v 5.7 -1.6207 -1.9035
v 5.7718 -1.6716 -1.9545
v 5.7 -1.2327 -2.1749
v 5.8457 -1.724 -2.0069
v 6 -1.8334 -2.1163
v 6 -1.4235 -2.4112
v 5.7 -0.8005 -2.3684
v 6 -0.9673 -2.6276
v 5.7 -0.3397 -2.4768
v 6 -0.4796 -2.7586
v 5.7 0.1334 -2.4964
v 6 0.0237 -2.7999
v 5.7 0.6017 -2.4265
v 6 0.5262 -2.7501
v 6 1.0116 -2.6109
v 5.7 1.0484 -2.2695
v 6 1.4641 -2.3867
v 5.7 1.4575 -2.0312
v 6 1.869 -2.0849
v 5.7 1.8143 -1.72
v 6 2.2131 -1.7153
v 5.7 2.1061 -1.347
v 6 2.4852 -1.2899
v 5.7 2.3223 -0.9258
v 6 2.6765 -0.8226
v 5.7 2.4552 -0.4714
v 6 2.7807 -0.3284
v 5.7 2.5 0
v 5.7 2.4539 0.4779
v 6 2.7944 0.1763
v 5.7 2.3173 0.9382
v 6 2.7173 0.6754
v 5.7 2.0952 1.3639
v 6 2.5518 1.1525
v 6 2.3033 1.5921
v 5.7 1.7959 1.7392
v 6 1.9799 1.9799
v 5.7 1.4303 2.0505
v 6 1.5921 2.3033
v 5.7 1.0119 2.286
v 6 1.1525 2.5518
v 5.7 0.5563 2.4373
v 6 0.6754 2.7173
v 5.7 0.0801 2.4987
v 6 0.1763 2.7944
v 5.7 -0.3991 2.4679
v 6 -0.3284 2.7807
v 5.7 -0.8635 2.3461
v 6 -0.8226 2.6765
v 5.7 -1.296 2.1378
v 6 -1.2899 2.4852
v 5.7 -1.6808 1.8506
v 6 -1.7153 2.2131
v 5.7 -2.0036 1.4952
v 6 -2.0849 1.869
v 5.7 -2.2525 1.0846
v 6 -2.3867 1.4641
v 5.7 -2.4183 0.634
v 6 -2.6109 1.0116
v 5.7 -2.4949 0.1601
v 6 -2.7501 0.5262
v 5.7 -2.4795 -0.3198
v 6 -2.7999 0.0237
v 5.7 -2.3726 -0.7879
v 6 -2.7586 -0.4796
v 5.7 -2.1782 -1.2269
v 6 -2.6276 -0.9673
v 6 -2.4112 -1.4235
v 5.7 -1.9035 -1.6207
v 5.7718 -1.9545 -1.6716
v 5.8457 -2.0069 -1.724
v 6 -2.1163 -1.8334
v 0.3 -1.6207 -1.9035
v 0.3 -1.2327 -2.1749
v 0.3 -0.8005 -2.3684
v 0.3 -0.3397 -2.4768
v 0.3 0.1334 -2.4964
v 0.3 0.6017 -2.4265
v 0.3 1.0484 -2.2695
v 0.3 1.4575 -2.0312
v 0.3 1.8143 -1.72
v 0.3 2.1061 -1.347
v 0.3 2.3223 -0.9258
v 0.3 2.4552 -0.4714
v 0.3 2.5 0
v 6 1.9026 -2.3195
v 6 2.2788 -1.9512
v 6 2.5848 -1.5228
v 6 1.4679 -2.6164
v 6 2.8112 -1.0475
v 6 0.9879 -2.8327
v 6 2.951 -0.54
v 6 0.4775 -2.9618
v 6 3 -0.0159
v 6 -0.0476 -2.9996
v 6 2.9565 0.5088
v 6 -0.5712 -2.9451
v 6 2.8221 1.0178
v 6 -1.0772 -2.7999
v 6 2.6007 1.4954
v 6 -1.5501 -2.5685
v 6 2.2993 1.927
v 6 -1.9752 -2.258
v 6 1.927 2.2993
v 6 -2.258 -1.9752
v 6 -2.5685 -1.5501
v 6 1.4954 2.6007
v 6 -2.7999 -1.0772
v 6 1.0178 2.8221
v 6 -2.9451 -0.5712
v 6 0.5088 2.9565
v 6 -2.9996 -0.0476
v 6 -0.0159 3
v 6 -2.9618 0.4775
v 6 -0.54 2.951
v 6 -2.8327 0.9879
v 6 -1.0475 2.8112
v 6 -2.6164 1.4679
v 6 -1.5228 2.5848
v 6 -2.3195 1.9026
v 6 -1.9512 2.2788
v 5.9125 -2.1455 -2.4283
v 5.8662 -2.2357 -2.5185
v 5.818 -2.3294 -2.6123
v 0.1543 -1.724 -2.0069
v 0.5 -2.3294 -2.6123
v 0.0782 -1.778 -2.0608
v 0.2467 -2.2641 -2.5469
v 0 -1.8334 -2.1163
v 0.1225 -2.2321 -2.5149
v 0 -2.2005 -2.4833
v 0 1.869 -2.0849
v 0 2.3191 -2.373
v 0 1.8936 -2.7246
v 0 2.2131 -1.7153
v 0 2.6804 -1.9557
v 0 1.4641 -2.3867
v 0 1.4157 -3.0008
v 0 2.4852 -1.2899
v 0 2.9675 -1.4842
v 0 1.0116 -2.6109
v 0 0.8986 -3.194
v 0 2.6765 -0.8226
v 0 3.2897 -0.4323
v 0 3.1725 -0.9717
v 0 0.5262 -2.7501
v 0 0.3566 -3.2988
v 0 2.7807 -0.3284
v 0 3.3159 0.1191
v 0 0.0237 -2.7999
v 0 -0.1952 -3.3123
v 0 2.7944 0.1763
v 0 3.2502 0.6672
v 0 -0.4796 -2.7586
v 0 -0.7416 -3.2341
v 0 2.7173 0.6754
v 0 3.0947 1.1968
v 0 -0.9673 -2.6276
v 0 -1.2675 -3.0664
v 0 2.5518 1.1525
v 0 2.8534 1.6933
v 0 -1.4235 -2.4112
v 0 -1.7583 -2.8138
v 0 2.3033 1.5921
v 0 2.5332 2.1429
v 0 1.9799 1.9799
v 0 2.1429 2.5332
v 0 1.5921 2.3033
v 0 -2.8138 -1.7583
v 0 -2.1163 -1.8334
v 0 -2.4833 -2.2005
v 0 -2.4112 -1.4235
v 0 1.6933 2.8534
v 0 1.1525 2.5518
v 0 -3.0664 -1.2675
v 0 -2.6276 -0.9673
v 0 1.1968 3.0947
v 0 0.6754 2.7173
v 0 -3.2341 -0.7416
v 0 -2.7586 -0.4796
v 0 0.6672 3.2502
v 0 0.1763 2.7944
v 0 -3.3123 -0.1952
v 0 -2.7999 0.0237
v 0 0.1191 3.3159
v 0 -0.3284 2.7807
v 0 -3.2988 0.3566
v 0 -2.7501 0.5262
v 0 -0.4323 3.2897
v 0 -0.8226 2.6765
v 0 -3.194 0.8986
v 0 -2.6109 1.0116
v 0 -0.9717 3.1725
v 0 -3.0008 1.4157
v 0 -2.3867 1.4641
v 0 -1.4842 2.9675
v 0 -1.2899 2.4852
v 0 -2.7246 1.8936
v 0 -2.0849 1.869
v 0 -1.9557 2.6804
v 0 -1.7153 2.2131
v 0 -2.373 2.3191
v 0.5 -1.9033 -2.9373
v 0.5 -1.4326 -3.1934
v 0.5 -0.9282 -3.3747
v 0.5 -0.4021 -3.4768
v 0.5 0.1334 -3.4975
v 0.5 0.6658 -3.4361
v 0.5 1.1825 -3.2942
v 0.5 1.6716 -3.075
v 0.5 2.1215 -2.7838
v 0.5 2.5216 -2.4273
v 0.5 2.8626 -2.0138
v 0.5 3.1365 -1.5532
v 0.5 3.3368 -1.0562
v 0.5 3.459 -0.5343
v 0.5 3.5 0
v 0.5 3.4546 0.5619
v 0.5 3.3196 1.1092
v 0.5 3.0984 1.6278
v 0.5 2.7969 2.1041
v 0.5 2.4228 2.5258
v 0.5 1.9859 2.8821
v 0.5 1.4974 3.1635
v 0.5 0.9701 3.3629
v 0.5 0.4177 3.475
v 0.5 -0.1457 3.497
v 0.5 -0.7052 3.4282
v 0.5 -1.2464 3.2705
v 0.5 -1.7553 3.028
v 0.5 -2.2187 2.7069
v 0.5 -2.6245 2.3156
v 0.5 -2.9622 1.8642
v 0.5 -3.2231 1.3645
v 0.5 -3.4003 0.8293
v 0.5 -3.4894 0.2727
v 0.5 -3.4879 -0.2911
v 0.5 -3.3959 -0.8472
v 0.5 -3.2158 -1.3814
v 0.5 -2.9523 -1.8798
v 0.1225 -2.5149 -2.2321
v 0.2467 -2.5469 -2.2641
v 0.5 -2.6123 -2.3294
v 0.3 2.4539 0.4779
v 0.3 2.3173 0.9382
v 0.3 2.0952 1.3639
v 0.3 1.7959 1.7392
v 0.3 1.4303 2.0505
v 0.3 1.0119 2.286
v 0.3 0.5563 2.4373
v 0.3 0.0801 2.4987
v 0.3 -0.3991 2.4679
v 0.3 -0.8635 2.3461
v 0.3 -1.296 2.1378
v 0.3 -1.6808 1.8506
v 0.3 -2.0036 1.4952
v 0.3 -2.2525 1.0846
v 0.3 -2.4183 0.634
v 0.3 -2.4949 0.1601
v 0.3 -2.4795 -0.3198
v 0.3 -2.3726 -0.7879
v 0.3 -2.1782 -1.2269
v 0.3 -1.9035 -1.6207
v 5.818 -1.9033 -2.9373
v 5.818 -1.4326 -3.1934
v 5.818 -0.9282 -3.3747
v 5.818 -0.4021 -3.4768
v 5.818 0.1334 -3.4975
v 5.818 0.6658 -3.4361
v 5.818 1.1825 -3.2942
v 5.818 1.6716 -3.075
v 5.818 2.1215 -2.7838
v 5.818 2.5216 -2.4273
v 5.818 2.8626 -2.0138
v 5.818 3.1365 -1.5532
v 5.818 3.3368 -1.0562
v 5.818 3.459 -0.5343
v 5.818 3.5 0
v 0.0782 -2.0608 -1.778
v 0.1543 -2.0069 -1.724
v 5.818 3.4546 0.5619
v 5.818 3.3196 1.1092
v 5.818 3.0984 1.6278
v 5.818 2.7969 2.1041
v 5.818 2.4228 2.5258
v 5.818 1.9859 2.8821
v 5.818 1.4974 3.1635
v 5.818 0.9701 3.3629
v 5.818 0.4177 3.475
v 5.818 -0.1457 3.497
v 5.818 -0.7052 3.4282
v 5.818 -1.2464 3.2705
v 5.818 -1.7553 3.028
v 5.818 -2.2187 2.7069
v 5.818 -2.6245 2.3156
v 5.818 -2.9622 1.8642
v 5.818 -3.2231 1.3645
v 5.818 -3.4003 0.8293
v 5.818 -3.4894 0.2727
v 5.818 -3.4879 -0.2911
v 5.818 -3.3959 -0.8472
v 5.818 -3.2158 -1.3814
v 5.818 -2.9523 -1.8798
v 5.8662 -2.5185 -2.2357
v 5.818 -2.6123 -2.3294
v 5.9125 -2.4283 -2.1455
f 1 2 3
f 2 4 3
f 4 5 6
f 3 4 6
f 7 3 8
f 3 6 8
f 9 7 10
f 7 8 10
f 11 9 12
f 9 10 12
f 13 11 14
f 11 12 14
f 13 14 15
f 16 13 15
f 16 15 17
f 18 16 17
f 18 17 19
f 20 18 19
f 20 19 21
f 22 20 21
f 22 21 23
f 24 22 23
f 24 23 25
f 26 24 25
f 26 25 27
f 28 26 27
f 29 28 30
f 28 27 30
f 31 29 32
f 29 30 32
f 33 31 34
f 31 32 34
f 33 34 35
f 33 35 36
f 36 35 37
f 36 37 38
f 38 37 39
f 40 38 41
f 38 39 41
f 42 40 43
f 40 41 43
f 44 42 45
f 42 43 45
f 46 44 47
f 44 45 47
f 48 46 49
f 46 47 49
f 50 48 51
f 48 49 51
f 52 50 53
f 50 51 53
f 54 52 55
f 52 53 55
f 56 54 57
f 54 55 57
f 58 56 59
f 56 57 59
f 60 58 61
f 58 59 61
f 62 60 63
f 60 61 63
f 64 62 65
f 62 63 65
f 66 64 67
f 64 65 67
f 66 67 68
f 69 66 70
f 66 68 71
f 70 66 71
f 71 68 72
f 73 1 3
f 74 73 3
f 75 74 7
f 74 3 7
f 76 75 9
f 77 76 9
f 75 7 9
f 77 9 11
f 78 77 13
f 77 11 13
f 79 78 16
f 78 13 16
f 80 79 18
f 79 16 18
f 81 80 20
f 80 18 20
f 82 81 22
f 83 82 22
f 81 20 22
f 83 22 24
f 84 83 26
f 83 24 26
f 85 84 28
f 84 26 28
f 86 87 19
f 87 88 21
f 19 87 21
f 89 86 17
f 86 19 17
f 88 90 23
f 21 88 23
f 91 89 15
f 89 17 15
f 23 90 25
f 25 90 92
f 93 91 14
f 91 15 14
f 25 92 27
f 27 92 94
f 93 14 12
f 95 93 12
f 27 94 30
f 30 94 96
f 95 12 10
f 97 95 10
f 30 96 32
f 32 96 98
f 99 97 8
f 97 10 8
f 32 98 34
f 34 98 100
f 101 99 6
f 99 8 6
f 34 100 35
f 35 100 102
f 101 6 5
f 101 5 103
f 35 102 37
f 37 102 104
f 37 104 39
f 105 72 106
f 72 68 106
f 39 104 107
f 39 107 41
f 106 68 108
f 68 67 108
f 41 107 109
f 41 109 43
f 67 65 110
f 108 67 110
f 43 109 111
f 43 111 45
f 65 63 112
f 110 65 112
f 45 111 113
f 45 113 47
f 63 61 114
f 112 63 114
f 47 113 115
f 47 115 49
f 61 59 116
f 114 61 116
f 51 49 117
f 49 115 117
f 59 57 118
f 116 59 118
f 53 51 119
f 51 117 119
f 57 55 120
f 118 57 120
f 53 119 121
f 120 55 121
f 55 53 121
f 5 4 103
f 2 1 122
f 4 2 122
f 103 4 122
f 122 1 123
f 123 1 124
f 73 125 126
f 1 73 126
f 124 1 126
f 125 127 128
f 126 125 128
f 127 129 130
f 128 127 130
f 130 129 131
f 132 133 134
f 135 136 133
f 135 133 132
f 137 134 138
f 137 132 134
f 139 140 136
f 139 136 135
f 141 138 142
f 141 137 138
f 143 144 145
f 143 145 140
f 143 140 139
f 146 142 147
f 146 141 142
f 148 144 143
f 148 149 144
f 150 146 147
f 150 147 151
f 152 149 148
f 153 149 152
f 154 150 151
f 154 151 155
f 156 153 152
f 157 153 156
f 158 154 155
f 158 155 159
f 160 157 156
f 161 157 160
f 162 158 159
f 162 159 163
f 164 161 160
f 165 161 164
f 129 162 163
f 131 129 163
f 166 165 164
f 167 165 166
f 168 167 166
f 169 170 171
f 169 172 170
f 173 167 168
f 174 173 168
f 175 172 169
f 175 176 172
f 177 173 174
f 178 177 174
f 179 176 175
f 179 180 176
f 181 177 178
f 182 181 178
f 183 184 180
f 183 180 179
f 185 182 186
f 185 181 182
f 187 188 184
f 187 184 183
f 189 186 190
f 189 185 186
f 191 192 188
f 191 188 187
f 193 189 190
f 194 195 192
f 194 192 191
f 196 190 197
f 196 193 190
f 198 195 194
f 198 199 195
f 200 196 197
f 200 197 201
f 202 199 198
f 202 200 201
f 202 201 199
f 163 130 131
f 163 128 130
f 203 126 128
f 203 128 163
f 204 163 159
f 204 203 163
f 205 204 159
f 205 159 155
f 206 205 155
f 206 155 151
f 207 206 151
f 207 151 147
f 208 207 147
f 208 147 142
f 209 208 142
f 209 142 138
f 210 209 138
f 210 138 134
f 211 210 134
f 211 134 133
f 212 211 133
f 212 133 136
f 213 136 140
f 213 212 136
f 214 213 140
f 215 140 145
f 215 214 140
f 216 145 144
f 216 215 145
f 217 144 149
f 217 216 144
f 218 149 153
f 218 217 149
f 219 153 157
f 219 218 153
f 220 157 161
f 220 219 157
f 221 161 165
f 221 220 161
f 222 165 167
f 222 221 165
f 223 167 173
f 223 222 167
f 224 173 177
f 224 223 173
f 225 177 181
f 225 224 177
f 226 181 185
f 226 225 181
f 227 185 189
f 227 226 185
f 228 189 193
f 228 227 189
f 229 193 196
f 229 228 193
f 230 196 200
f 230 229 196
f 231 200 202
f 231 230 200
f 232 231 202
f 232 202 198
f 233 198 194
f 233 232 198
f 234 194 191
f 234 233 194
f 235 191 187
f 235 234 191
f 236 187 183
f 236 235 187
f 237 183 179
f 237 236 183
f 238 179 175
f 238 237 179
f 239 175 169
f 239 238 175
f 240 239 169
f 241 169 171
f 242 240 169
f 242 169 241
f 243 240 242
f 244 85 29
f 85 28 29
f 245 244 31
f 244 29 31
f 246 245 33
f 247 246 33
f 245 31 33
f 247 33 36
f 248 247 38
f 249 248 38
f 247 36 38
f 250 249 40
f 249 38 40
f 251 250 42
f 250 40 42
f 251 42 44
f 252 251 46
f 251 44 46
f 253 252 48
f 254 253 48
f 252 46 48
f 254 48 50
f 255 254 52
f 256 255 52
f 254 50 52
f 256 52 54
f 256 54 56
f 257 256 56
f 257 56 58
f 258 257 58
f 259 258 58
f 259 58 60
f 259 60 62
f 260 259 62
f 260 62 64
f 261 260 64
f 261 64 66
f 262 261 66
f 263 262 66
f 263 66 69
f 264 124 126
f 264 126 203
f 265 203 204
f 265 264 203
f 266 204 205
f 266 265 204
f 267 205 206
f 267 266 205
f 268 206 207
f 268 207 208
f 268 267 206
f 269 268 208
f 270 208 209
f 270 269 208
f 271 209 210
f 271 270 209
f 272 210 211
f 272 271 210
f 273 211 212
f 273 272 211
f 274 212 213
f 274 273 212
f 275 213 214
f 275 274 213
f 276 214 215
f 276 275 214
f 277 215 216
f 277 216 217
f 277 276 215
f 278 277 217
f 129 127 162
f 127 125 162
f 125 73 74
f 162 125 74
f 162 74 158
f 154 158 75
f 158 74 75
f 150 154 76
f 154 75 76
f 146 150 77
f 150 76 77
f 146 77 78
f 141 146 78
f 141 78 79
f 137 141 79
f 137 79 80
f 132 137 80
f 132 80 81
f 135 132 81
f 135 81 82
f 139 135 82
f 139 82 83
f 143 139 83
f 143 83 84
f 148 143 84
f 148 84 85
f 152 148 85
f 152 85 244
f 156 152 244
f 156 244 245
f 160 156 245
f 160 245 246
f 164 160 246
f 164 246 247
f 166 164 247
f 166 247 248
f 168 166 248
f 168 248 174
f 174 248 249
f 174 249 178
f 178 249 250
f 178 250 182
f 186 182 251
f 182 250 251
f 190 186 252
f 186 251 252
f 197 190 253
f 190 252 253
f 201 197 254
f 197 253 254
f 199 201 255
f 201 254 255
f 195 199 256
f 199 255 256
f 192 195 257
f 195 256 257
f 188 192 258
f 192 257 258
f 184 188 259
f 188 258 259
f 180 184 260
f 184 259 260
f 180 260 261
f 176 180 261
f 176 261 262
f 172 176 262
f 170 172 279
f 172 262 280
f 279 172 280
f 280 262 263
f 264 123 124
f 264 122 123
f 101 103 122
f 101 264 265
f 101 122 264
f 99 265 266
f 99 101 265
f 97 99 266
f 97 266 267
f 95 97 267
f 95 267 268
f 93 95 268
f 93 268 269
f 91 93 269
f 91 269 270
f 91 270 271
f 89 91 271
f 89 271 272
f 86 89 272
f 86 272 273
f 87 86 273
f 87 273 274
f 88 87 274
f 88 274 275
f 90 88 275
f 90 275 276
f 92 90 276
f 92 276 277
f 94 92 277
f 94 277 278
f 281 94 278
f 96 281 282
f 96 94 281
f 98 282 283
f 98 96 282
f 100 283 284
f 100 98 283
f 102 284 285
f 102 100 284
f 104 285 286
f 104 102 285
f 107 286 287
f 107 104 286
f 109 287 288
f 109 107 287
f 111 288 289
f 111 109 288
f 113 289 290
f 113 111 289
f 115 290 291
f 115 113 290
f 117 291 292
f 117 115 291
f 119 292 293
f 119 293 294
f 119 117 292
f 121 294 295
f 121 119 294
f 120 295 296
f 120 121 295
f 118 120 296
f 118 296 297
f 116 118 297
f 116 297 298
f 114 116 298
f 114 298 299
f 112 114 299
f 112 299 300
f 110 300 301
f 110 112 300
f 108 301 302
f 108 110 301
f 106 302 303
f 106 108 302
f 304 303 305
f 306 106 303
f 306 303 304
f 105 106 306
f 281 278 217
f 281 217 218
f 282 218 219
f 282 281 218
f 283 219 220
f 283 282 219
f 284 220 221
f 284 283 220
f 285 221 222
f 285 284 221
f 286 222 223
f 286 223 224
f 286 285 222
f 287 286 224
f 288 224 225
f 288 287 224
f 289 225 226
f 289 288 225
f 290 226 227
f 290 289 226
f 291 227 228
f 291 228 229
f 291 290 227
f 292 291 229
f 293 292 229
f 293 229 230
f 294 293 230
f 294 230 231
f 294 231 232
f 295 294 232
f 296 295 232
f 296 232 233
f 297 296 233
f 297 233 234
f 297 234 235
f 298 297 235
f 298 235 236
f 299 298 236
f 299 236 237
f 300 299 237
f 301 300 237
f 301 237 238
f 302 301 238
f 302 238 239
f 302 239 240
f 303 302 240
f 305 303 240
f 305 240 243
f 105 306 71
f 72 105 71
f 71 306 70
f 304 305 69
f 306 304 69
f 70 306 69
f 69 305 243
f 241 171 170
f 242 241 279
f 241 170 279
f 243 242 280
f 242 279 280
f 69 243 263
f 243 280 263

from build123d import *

# Parameters (mm, degrees)
SKETCH1_W             = 6
SKETCH1_H             = 3.5
CUT_EXTRUDE1_DEPTH    = 7
SKETCH3_W             = 6
SKETCH3_H             = 2.5
CHAMFER1_SIZE         = 0.3
CHAMFER2_SIZE         = 0.181985117
CHAMFER2_SIZE2        = 0.5
CHAMFER2_PART_2_SIZE  = 0.181985117
CHAMFER2_PART_2_SIZE2 = 0.5


with BuildPart() as part:
    # Sketch1 → Revolve1 (revolve)
    with BuildSketch(Plane.XY):
        with Locations((3, 1.75)):
            Rectangle(SKETCH1_W, SKETCH1_H)
    revolve(axis=Axis((0, 0, 0), (1, 0, 0)))

    # Sketch2 → Cut-Extrude1 (cut, through all)
    with BuildSketch(Plane.ZY):
        with BuildLine():
            Line((-2.329408464, -2.612251176), (-1.620679662, -1.903522375))
            ThreePointArc((-1.620679662, -1.903522375), (-1.767766953, -1.767766953), (-1.903522375, -1.620679662))
            Line((-1.903522375, -1.620679662), (-2.612251176, -2.329408464))
            ThreePointArc((-2.612251176, -2.329408464), (-2.474873734, -2.474873734), (-2.329408464, -2.612251176))
        make_face()
    extrude(amount=-CUT_EXTRUDE1_DEPTH, mode=Mode.SUBTRACT)

    # Sketch3 → Cut-Revolve1 (revolve, cut)
    with BuildSketch(Plane.XY):
        with Locations((3, 1.25)):
            Rectangle(SKETCH3_W, SKETCH3_H)
    revolve(axis=Axis((0, 0, 0), (1, 0, 0)), mode=Mode.SUBTRACT)

    # Chamfer1
    chamfer1_edges = [part.edges().sort_by_distance(p)[0] for p in [
        (0, -0.863479607, 2.346146408),
        (6, -0.863479607, 2.346146408),
    ]]
    chamfer(chamfer1_edges, length=CHAMFER1_SIZE)

    # Chamfer2
    chamfer2_edges = [part.edges().sort_by_distance(p)[0] for p in [
        (0, -1.246419047, 3.270541172),
    ]]
    chamfer2_side = [part.faces().sort_by_distance(p)[0] for p in [
        (0, -2.011414437, -2.434257149),
    ]]
    chamfer(chamfer2_edges, length=CHAMFER2_SIZE, length2=CHAMFER2_SIZE2, reference=chamfer2_side[0])

    # Chamfer2 part 2
    chamfer2_part_2_edges = [part.edges().sort_by_distance(p)[0] for p in [
        (6, -1.246419047, 3.270541172),
    ]]
    chamfer2_part_2_side = [part.faces().sort_by_distance(p)[0] for p in [
        (3, -1.246419047, 3.270541172),
    ]]
    chamfer(chamfer2_part_2_edges, length=CHAMFER2_PART_2_SIZE, length2=CHAMFER2_PART_2_SIZE2, reference=chamfer2_part_2_side[0])


solid = part.part
